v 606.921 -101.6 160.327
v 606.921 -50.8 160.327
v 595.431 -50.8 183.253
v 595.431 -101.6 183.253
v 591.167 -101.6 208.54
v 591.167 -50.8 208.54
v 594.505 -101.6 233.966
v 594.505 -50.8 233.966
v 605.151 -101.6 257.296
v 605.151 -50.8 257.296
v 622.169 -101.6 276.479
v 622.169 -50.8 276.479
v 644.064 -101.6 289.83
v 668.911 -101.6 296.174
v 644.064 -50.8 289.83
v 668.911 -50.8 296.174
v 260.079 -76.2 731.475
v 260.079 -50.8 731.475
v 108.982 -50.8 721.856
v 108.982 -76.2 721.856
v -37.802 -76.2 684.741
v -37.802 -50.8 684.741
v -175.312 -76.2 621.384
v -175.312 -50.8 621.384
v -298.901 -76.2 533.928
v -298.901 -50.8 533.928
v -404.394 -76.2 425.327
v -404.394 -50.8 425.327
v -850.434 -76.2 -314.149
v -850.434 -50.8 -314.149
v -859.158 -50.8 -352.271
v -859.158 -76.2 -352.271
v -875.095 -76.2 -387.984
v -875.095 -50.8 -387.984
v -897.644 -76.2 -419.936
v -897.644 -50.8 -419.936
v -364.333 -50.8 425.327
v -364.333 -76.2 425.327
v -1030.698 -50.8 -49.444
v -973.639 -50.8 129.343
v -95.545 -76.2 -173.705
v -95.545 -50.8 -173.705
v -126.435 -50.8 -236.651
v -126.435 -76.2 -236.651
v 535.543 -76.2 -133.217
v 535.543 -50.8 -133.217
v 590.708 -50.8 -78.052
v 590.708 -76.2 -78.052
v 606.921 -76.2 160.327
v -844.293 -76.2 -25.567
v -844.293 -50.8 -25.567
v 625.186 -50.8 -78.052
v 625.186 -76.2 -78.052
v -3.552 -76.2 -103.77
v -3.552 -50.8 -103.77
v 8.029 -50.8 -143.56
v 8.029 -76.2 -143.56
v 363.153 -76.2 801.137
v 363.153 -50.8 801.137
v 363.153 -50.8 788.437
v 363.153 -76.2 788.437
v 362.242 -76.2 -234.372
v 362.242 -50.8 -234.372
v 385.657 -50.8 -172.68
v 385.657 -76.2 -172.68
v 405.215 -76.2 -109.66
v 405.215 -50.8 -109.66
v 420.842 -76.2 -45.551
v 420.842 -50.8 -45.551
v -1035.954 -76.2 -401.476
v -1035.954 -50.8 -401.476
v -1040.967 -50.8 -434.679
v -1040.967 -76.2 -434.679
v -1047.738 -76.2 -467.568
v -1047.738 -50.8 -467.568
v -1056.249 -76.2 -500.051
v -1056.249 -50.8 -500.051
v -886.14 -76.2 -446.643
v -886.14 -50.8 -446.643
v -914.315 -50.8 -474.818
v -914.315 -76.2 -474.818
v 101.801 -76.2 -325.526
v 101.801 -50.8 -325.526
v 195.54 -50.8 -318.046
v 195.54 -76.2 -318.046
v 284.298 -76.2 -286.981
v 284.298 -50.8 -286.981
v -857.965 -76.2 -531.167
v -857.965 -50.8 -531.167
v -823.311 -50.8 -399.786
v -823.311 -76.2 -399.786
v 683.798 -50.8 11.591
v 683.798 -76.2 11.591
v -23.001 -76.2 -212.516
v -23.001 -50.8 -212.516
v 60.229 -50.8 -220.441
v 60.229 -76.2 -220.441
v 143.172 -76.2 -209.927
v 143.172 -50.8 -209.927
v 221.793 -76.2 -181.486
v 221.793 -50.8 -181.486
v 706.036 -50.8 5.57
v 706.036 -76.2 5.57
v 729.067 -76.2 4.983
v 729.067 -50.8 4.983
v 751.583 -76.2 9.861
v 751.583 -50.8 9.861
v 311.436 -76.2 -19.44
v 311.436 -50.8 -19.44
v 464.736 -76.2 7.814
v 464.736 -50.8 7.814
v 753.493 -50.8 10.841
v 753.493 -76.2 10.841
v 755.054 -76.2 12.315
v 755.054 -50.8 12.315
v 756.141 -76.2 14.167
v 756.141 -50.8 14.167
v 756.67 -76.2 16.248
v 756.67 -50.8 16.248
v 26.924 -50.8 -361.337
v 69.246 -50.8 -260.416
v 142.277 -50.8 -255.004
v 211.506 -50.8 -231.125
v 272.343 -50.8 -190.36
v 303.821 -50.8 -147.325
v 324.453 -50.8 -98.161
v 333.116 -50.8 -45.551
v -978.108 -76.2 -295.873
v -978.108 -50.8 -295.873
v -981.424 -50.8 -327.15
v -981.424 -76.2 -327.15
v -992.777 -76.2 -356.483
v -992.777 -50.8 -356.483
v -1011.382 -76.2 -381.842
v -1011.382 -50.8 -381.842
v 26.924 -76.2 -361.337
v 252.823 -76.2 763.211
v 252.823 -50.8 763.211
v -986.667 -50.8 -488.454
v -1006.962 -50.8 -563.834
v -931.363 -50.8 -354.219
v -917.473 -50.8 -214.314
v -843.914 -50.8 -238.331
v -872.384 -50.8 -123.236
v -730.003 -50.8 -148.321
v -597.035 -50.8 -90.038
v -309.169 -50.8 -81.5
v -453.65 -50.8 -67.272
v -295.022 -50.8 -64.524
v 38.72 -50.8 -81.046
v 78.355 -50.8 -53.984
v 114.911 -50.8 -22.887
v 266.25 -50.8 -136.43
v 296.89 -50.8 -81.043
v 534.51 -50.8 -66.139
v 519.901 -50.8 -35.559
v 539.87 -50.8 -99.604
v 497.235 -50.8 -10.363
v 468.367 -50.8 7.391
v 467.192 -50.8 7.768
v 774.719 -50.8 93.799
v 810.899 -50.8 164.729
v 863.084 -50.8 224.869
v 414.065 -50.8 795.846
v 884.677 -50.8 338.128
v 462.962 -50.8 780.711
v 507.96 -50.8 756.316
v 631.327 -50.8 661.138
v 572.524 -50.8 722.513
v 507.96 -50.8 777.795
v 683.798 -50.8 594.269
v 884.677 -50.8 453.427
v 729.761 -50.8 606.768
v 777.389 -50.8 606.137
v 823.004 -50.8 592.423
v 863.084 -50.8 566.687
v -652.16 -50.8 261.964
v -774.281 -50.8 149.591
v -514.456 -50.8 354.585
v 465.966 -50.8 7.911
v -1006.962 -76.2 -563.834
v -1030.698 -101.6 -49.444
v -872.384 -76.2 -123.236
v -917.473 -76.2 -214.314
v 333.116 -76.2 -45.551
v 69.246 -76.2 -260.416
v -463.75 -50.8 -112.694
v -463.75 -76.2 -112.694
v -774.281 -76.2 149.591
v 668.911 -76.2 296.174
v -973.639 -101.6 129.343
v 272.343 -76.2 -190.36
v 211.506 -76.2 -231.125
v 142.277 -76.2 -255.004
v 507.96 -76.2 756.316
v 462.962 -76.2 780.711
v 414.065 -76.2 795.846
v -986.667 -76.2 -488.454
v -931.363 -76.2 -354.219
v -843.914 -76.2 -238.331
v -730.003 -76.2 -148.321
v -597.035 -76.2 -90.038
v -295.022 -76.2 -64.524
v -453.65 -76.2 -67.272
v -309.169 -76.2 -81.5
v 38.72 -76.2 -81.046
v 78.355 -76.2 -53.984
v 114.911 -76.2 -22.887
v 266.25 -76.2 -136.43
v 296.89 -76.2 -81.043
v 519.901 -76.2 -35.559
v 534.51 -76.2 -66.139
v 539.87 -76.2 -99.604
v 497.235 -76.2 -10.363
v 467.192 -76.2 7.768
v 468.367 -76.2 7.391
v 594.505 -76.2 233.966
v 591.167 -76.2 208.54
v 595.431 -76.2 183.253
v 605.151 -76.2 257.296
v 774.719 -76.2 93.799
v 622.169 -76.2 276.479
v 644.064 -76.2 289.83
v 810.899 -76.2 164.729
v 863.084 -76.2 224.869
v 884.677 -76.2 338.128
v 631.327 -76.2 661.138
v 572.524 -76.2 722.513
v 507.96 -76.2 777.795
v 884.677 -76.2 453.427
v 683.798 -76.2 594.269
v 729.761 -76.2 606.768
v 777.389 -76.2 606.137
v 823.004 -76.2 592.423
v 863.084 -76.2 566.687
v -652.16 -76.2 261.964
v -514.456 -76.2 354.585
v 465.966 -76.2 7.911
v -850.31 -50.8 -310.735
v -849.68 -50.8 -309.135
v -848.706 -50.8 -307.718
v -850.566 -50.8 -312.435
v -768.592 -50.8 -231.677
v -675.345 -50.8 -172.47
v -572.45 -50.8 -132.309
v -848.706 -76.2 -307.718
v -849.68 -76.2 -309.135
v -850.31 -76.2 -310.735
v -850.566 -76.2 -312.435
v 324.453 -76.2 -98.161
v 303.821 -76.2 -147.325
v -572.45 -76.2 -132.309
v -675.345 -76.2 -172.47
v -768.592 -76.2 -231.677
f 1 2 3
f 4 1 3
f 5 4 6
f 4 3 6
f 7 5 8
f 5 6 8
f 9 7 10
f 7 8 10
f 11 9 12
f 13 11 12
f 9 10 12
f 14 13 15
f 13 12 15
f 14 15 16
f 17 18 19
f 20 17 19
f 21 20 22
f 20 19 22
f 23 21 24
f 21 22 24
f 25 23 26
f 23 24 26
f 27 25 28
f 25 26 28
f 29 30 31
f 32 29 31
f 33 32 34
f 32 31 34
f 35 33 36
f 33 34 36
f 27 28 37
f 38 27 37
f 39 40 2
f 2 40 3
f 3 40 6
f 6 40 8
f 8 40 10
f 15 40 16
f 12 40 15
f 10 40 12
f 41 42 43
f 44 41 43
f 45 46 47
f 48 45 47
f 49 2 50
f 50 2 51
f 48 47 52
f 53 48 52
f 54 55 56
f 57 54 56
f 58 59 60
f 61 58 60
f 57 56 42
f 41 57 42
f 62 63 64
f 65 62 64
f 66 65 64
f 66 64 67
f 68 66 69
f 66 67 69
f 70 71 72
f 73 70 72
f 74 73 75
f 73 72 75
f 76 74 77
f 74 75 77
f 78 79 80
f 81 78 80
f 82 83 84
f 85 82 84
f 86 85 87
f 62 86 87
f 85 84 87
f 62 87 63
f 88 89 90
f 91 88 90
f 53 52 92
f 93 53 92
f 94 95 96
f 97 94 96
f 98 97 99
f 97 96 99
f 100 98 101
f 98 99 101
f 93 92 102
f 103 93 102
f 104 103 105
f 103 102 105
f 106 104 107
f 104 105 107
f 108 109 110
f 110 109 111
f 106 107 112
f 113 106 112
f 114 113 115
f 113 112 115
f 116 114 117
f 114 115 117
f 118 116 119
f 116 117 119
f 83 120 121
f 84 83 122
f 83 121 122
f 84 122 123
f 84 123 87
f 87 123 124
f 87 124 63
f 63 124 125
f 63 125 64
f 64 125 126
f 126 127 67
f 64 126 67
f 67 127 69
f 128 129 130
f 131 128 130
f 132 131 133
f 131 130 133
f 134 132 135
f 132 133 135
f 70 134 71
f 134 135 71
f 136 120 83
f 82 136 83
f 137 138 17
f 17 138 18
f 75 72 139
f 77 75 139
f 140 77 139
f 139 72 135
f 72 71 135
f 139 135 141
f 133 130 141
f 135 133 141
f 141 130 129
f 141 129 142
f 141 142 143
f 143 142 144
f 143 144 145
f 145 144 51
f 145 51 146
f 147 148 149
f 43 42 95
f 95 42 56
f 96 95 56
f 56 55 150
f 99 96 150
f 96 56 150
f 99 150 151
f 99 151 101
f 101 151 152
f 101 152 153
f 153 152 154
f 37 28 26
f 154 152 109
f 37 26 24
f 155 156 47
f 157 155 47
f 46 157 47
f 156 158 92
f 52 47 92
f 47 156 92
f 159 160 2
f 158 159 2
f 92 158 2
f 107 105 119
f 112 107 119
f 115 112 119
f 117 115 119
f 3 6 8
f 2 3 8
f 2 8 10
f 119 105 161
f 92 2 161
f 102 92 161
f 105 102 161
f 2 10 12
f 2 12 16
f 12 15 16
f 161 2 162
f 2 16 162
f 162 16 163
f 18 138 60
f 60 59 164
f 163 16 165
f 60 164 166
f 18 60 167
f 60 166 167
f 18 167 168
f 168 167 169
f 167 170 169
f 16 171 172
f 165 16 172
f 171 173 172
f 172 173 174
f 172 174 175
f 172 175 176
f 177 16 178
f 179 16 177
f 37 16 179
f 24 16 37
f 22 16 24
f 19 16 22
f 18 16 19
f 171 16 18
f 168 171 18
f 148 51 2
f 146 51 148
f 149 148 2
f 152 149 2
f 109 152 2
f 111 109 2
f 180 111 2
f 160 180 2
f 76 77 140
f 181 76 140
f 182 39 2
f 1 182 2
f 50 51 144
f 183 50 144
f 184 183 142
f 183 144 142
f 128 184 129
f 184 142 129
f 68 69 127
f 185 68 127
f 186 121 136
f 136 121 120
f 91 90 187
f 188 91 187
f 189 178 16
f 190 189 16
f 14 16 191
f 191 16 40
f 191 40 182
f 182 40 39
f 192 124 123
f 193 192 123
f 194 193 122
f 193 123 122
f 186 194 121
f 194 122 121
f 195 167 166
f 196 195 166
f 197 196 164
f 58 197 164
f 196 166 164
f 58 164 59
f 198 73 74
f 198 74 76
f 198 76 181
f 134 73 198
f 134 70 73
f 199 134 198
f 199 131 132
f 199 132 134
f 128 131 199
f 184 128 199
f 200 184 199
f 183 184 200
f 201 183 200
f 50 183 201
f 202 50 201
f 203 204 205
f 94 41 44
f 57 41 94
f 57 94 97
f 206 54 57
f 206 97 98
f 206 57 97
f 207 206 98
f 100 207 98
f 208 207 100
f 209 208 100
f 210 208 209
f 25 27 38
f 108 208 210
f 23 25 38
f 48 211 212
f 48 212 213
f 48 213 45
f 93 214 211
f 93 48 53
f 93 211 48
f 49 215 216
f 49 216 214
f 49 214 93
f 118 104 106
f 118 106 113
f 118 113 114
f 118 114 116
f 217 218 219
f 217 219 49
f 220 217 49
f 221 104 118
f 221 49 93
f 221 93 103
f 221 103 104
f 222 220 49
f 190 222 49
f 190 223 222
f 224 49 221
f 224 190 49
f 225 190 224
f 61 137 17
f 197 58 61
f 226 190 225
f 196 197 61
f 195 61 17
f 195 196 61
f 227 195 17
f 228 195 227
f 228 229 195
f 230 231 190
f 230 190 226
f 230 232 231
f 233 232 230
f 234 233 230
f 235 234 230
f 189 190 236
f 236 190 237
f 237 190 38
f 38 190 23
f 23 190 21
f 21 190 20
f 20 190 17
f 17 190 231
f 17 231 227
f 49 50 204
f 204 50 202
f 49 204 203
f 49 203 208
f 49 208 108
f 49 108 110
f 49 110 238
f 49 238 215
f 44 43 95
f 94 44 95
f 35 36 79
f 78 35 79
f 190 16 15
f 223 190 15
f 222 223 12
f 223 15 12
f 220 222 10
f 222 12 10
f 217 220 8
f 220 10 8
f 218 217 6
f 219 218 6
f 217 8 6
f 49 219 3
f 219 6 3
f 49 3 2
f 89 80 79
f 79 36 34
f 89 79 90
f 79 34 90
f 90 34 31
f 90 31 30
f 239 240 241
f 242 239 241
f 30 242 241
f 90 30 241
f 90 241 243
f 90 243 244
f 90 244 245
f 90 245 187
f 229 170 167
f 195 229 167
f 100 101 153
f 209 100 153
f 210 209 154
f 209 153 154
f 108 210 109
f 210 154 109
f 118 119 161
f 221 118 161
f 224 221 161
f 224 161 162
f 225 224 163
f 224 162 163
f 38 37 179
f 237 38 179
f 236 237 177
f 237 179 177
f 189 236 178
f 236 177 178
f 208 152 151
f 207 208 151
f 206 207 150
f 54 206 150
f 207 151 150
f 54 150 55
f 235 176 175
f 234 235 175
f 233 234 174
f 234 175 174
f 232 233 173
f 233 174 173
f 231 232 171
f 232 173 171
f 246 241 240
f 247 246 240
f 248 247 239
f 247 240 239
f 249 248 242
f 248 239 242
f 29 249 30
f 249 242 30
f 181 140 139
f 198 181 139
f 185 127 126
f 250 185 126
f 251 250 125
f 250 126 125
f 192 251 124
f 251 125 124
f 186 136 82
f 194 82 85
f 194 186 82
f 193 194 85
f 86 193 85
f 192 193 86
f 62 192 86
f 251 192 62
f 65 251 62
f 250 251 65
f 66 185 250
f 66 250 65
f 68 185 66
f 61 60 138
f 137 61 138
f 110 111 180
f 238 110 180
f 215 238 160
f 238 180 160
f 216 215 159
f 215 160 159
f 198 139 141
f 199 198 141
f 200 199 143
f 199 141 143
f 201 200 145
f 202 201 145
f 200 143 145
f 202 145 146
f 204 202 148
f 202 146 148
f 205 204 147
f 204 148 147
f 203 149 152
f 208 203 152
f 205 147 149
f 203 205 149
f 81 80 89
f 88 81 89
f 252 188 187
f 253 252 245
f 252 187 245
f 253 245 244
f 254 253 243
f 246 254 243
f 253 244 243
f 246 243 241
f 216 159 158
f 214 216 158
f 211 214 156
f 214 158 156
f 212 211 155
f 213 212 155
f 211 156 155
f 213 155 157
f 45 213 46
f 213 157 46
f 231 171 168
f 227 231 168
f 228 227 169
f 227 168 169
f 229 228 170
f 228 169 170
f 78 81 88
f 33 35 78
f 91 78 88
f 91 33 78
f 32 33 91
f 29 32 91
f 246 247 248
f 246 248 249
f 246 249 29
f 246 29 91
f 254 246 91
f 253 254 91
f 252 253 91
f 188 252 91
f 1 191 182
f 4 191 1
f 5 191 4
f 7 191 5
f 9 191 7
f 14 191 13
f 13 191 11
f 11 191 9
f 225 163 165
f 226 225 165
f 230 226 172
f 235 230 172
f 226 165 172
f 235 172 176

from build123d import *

# Parameters (mm, degrees)
F1_DEPTH  = 50.8
F3_DEPTH  = 25.4
F5_DEPTH  = 50.8
F7_DEPTH  = 50.8
F9_DEPTH  = 25.4
F11_DEPTH = 25.4
F13_DEPTH = 25.4
F15_DEPTH = 25.4


with BuildPart() as f1:
    # F0 (on Front) → F1 (new body)
    with BuildSketch(Plane.XZ):
        with BuildLine():
            Line((668.9107223376, 296.1744000085), (-973.638589538, 129.3428740397))
            Line((-973.638589538, 129.3428740397), (-1030.6983907301, -49.4444440727))
            Line((-1030.6983907301, -49.4444440727), (606.9209202884, 160.326841329))
            ThreePointArc((606.9209202884, 160.326841329), (598.9585537881, 246.0275562701), (668.9107223376, 296.1744000085))
        make_face()
    extrude(amount=F1_DEPTH)

    # F6 (on face) → F7 (cut)
    with BuildSketch(Plane(origin=(0, 0, 0), x_dir=(-1, 0, 0), z_dir=(0, 1, 0))):
        with BuildLine():
            Line((973.638589538, 129.3428740397), (-668.9107223376, 296.1744000085))
            ThreePointArc((-668.9107223376, 296.1744000085), (-598.9585537881, 246.0275562701), (-606.9209202884, 160.326841329))
            Line((-606.9209202884, 160.326841329), (1030.6983907301, -49.4444440727))
            Line((1030.6983907301, -49.4444440727), (973.638589538, 129.3428740397))
        make_face()
    extrude(amount=-F7_DEPTH, mode=Mode.SUBTRACT)


with BuildPart() as f3:
    # F2 (on face) → F3 (new body)
    with BuildSketch(Plane.XZ.offset(50.8)):
        with BuildLine():
            Line((252.8231143951, 763.2114291191), (260.0792597578, 731.4753143195))
            ThreePointArc((260.0792597578, 731.4753143195), (-108.0157204055, 656.2289322909), (-404.3941316745, 425.3268539906))
            Line((-404.3941316745, 425.3268539906), (-364.3333911896, 425.3268539906))
            ThreePointArc((-364.3333911896, 425.3268539906), (-585.0653026288, 310.8876425767), (-774.2806055216, 149.5913965328))
            Line((-774.2806055216, 149.5913965328), (668.9107223376, 296.1744000085))
            ThreePointArc((668.9107223376, 296.1744000085), (598.9585537881, 246.0275562701), (606.9209202884, 160.326841329))
            Line((606.9209202884, 160.326841329), (-844.2928764091, -25.5667796595))
            ThreePointArc((-844.2928764091, -25.5667796595), (-892.8823459917, -169.7880637292), (-978.108048439, -295.8725392818))
            ThreePointArc((-978.108048439, -295.8725392818), (-992.7766309961, -356.4826312083), (-1035.9544754028, -401.4762341976))
            ThreePointArc((-1035.9544754028, -401.4762341976), (-1044.1334912394, -451.1686450263), (-1056.2492609024, -500.0505447388))
            Line((-1056.2492609024, -500.0505447388), (-1006.9620609283, -563.8339519501))
            Line((-1006.9620609283, -563.8339519501), (-986.6673946381, -488.453567028))
            ThreePointArc((-986.6673946381, -488.453567028), (-730.0030998205, -148.32094961), (-309.1685473919, -81.5000161529))
            Line((-309.1685473919, -81.5000161529), (-295.0216254312, -64.5236975716))
            Line((-295.0216254312, -64.5236975716), (114.9110347033, -22.8873882443))
            ThreePointArc((114.9110347033, -22.8873882443), (58.8957433569, -68.0390446038), (-3.5516790672, -103.7700447186))
            Line((-3.5516790672, -103.7700447186), (8.0292224884, -143.5604542494))
            Line((8.0292224884, -143.5604542494), (-95.5446205932, -173.7053684286))
            Line((-95.5446205932, -173.7053684286), (-126.4350712299, -236.6511076689))
            Line((-126.4350712299, -236.6511076689), (-23.0009946972, -212.5164866447))
            ThreePointArc((-23.0009946972, -212.5164866447), (101.9915115452, -217.4774359696), (221.7929065228, -181.4862787724))
            ThreePointArc((221.7929065228, -181.4862787724), (283.4661379535, -109.7852043171), (311.4357590675, -19.439579919))
            Line((311.4357590675, -19.439579919), (464.7360989186, 7.8138095175))
            ThreePointArc((464.7360989186, 7.8138095175), (466.5824829372, 7.869165753), (468.3666758386, 7.3907789354))
            ThreePointArc((468.3666758386, 7.3907789354), (528.3038755098, -50.3246919943), (535.54284547, -133.2170366528))
            Line((535.54284547, -133.2170366528), (590.7077191624, -78.0522076639))
            Line((590.7077191624, -78.0522076639), (625.1857280731, -78.0522076639))
            Line((625.1857280731, -78.0522076639), (683.7983130659, 11.5906373156))
            ThreePointArc((683.7983130659, 11.5906373156), (717.5338391437, 4.5880666159), (751.5826313881, 9.8607758671))
            ThreePointArc((751.5826313881, 9.8607758671), (755.0537907212, 12.3153575814), (756.6696154819, 16.2476633745))
            ThreePointArc((756.6696154819, 16.2476633745), (790.6520509526, 130.3644655572), (863.0842160836, 224.868602585))
            ThreePointArc((863.0842160836, 224.868602585), (887.3943414393, 395.7776857329), (863.0842160836, 566.6867688808))
            ThreePointArc((863.0842160836, 566.6867688808), (777.3887385904, 606.1366766902), (683.7982803898, 594.269232872))
            ThreePointArc((683.7982803898, 594.269232872), (602.682958571, 692.5508134266), (507.9604538295, 777.7952361509))
            Line((507.9604538295, 777.7952361509), (507.9604538295, 756.315767765))
            ThreePointArc((507.9604538295, 756.315767765), (438.8854619383, 789.4811282868), (363.1528318299, 801.1372159736))
            Line((363.1528318299, 801.1372159736), (363.1528318299, 788.4372159736))
            Line((363.1528318299, 788.4372159736), (252.8231143951, 763.2114291191))
        make_face()
    extrude(amount=F3_DEPTH)

    # F14 (on face) → F15 (cut)
    with BuildSketch(Plane(origin=(0, -25.4, 0), x_dir=(-1, 0, 0), z_dir=(0, 1, 0))):
        with BuildLine():
            Line((-26.9238203764, -361.3369762897), (-69.2455992103, -260.4158222675))
            ThreePointArc((-69.2455992103, -260.4158222675), (-177.6634852356, -245.3019366193), (-272.3434729128, -190.3604451668))
            ThreePointArc((-272.3434729128, -190.3604451668), (-315.5776524746, -123.34784734), (-333.116315579, -45.5514602363))
            Line((-333.116315579, -45.5514602363), (-420.8418428898, -45.5514602363))
            ThreePointArc((-420.8418428898, -45.5514602363), (-395.9229268117, -141.3211070327), (-362.2424900532, -234.3716621399))
            ThreePointArc((-362.2424900532, -234.3716621399), (-240.9186624153, -305.3690049671), (-101.8007993698, -325.5262374878))
            Line((-101.8007993698, -325.5262374878), (-26.9238203764, -361.3369762897))
        make_face()
    extrude(amount=-F15_DEPTH, mode=Mode.SUBTRACT)


with BuildPart() as f5:
    # F4 (on face) → F5 (new body)
    with BuildSketch(Plane.XZ.offset(50.8)):
        with BuildLine():
            Line((668.9107223376, 296.1744000085), (-973.638589538, 129.3428740397))
            Line((-973.638589538, 129.3428740397), (-1030.6983907301, -49.4444440727))
            Line((-1030.6983907301, -49.4444440727), (606.9209202884, 160.326841329))
            ThreePointArc((606.9209202884, 160.326841329), (598.9585537881, 246.0275562701), (668.9107223376, 296.1744000085))
        make_face()
    extrude(amount=F5_DEPTH)


with BuildPart() as f9:
    # F8 (on face) → F9 (new body)
    with BuildSketch(Plane(origin=(0, -50.8, 0), x_dir=(-1, 0, 0), z_dir=(0, 1, 0))):
        with BuildLine():
            ThreePointArc((850.4342842837, -314.1488422037), (850.3100605438, -310.7345540712), (848.7064378979, -307.717736311))
            ThreePointArc((848.7064378979, -307.717736311), (675.3453518171, -172.4701702764), (463.7495577336, -112.694002688))
            Line((463.7495577336, -112.694002688), (823.3108520508, -399.7856080532))
            Line((823.3108520508, -399.7856080532), (857.9654097557, -531.1673879623))
            Line((857.9654097557, -531.1673879623), (914.314866066, -474.8179316521))
            Line((914.314866066, -474.8179316521), (886.1401379108, -446.6432034969))
            Line((886.1401379108, -446.6432034969), (897.6440429687, -419.9363589287))
            ThreePointArc((897.6440429687, -419.9363589287), (866.2563072958, -370.5158531825), (850.4342842837, -314.1488422037))
        make_face()
    extrude(amount=F9_DEPTH)


with BuildPart() as f9b:
    # F8 (on face) → F9, piece 2 (new body)
    with BuildSketch(Plane(origin=(0, -50.8, 0), x_dir=(-1, 0, 0), z_dir=(0, 1, 0))):
        with BuildLine():
            ThreePointArc((-272.3434729128, -190.3604451668), (-315.5776524746, -123.34784734), (-333.116315579, -45.5514602363))
            Line((-333.116315579, -45.5514602363), (-420.8418428898, -45.5514602363))
            ThreePointArc((-420.8418428898, -45.5514602363), (-395.9229268117, -141.3211070327), (-362.2424900532, -234.3716621399))
            ThreePointArc((-362.2424900532, -234.3716621399), (-240.9186624153, -305.3690049671), (-101.8007993698, -325.5262374878))
            Line((-101.8007993698, -325.5262374878), (-26.9238203764, -361.3369762897))
            Line((-26.9238203764, -361.3369762897), (-69.2455992103, -260.4158222675))
            ThreePointArc((-69.2455992103, -260.4158222675), (-177.6634852356, -245.3019366193), (-272.3434729128, -190.3604451668))
        make_face()
    extrude(amount=F9_DEPTH)


with BuildPart() as f11:
    # F10 (on face) → F11 (new body)
    with BuildSketch(Plane.XZ.offset(50.8)):
        with BuildLine():
            Line((-823.3108520508, -399.7856080532), (-463.7495577336, -112.694002688))
            ThreePointArc((-463.7495577336, -112.694002688), (-675.3453518171, -172.4701702764), (-848.7064378979, -307.717736311))
            ThreePointArc((-848.7064378979, -307.717736311), (-850.3100605438, -310.7345540712), (-850.4342842837, -314.1488422037))
            ThreePointArc((-850.4342842837, -314.1488422037), (-866.2563072958, -370.5158531825), (-897.6440429687, -419.9363589287))
            Line((-897.6440429687, -419.9363589287), (-886.1401379108, -446.6432034969))
            Line((-886.1401379108, -446.6432034969), (-914.314866066, -474.8179316521))
            Line((-914.314866066, -474.8179316521), (-857.9654097557, -531.1673879623))
            Line((-857.9654097557, -531.1673879623), (-823.3108520508, -399.7856080532))
        make_face()
    extrude(amount=F11_DEPTH)


with BuildPart() as f11b:
    # F10 (on face) → F11, piece 2 (new body)
    with BuildSketch(Plane.XZ.offset(50.8)):
        with BuildLine():
            ThreePointArc((362.2424900532, -234.3716621399), (395.9229268117, -141.3211070327), (420.8418428898, -45.5514602363))
            Line((420.8418428898, -45.5514602363), (333.116315579, -45.5514602363))
            ThreePointArc((333.116315579, -45.5514602363), (315.5776524746, -123.34784734), (272.3434729128, -190.3604451668))
            ThreePointArc((272.3434729128, -190.3604451668), (177.6634852356, -245.3019366193), (69.2455992103, -260.4158222675))
            Line((69.2455992103, -260.4158222675), (26.9238203764, -361.3369762897))
            Line((26.9238203764, -361.3369762897), (101.8007993698, -325.5262374878))
            ThreePointArc((101.8007993698, -325.5262374878), (240.9186624153, -305.3690049671), (362.2424900532, -234.3716621399))
        make_face()
    extrude(amount=F11_DEPTH)


with BuildPart() as f13_tool:
    # F12 (on face) → F13 (new body)
    with BuildSketch(Plane(origin=(0, -25.4, 0), x_dir=(-1, 0, 0), z_dir=(0, 1, 0))):
        with BuildLine():
            Line((886.1401379108, -446.6432034969), (897.6440429687, -419.9363589287))
            ThreePointArc((897.6440429687, -419.9363589287), (866.2563072958, -370.5158531825), (850.4342842837, -314.1488422037))
            ThreePointArc((850.4342842837, -314.1488422037), (850.3100605438, -310.7345540712), (848.7064378979, -307.717736311))
            ThreePointArc((848.7064378979, -307.717736311), (675.3453518171, -172.4701702764), (463.7495577336, -112.694002688))
            Line((463.7495577336, -112.694002688), (823.3108520508, -399.7856080532))
            Line((823.3108520508, -399.7856080532), (857.9654097557, -531.1673879623))
            Line((857.9654097557, -531.1673879623), (914.314866066, -474.8179316521))
            Line((914.314866066, -474.8179316521), (886.1401379108, -446.6432034969))
        make_face()
        with BuildLine():
            Line((-26.9238203764, -361.3369762897), (-69.2455992103, -260.4158222675))
            ThreePointArc((-69.2455992103, -260.4158222675), (-177.6634852356, -245.3019366193), (-272.3434729128, -190.3604451668))
            ThreePointArc((-272.3434729128, -190.3604451668), (-315.5776524746, -123.34784734), (-333.116315579, -45.5514602363))
            Line((-333.116315579, -45.5514602363), (-420.8418428898, -45.5514602363))
            ThreePointArc((-420.8418428898, -45.5514602363), (-395.9229268117, -141.3211070327), (-362.2424900532, -234.3716621399))
            ThreePointArc((-362.2424900532, -234.3716621399), (-240.9186624153, -305.3690049671), (-101.8007993698, -325.5262374878))
            Line((-101.8007993698, -325.5262374878), (-26.9238203764, -361.3369762897))
        make_face()
    extrude(amount=-F13_DEPTH)


with BuildPart() as f9_1:
    add(f9.part)

    # F13: cut by f13_tool
    add(f13_tool.part, mode=Mode.SUBTRACT)


with BuildPart() as f9b_1:
    add(f9b.part)

    # F13: cut by f13_tool
    add(f13_tool.part, mode=Mode.SUBTRACT)


solid = Compound([f3.part, f5.part, f11.part, f11b.part])
